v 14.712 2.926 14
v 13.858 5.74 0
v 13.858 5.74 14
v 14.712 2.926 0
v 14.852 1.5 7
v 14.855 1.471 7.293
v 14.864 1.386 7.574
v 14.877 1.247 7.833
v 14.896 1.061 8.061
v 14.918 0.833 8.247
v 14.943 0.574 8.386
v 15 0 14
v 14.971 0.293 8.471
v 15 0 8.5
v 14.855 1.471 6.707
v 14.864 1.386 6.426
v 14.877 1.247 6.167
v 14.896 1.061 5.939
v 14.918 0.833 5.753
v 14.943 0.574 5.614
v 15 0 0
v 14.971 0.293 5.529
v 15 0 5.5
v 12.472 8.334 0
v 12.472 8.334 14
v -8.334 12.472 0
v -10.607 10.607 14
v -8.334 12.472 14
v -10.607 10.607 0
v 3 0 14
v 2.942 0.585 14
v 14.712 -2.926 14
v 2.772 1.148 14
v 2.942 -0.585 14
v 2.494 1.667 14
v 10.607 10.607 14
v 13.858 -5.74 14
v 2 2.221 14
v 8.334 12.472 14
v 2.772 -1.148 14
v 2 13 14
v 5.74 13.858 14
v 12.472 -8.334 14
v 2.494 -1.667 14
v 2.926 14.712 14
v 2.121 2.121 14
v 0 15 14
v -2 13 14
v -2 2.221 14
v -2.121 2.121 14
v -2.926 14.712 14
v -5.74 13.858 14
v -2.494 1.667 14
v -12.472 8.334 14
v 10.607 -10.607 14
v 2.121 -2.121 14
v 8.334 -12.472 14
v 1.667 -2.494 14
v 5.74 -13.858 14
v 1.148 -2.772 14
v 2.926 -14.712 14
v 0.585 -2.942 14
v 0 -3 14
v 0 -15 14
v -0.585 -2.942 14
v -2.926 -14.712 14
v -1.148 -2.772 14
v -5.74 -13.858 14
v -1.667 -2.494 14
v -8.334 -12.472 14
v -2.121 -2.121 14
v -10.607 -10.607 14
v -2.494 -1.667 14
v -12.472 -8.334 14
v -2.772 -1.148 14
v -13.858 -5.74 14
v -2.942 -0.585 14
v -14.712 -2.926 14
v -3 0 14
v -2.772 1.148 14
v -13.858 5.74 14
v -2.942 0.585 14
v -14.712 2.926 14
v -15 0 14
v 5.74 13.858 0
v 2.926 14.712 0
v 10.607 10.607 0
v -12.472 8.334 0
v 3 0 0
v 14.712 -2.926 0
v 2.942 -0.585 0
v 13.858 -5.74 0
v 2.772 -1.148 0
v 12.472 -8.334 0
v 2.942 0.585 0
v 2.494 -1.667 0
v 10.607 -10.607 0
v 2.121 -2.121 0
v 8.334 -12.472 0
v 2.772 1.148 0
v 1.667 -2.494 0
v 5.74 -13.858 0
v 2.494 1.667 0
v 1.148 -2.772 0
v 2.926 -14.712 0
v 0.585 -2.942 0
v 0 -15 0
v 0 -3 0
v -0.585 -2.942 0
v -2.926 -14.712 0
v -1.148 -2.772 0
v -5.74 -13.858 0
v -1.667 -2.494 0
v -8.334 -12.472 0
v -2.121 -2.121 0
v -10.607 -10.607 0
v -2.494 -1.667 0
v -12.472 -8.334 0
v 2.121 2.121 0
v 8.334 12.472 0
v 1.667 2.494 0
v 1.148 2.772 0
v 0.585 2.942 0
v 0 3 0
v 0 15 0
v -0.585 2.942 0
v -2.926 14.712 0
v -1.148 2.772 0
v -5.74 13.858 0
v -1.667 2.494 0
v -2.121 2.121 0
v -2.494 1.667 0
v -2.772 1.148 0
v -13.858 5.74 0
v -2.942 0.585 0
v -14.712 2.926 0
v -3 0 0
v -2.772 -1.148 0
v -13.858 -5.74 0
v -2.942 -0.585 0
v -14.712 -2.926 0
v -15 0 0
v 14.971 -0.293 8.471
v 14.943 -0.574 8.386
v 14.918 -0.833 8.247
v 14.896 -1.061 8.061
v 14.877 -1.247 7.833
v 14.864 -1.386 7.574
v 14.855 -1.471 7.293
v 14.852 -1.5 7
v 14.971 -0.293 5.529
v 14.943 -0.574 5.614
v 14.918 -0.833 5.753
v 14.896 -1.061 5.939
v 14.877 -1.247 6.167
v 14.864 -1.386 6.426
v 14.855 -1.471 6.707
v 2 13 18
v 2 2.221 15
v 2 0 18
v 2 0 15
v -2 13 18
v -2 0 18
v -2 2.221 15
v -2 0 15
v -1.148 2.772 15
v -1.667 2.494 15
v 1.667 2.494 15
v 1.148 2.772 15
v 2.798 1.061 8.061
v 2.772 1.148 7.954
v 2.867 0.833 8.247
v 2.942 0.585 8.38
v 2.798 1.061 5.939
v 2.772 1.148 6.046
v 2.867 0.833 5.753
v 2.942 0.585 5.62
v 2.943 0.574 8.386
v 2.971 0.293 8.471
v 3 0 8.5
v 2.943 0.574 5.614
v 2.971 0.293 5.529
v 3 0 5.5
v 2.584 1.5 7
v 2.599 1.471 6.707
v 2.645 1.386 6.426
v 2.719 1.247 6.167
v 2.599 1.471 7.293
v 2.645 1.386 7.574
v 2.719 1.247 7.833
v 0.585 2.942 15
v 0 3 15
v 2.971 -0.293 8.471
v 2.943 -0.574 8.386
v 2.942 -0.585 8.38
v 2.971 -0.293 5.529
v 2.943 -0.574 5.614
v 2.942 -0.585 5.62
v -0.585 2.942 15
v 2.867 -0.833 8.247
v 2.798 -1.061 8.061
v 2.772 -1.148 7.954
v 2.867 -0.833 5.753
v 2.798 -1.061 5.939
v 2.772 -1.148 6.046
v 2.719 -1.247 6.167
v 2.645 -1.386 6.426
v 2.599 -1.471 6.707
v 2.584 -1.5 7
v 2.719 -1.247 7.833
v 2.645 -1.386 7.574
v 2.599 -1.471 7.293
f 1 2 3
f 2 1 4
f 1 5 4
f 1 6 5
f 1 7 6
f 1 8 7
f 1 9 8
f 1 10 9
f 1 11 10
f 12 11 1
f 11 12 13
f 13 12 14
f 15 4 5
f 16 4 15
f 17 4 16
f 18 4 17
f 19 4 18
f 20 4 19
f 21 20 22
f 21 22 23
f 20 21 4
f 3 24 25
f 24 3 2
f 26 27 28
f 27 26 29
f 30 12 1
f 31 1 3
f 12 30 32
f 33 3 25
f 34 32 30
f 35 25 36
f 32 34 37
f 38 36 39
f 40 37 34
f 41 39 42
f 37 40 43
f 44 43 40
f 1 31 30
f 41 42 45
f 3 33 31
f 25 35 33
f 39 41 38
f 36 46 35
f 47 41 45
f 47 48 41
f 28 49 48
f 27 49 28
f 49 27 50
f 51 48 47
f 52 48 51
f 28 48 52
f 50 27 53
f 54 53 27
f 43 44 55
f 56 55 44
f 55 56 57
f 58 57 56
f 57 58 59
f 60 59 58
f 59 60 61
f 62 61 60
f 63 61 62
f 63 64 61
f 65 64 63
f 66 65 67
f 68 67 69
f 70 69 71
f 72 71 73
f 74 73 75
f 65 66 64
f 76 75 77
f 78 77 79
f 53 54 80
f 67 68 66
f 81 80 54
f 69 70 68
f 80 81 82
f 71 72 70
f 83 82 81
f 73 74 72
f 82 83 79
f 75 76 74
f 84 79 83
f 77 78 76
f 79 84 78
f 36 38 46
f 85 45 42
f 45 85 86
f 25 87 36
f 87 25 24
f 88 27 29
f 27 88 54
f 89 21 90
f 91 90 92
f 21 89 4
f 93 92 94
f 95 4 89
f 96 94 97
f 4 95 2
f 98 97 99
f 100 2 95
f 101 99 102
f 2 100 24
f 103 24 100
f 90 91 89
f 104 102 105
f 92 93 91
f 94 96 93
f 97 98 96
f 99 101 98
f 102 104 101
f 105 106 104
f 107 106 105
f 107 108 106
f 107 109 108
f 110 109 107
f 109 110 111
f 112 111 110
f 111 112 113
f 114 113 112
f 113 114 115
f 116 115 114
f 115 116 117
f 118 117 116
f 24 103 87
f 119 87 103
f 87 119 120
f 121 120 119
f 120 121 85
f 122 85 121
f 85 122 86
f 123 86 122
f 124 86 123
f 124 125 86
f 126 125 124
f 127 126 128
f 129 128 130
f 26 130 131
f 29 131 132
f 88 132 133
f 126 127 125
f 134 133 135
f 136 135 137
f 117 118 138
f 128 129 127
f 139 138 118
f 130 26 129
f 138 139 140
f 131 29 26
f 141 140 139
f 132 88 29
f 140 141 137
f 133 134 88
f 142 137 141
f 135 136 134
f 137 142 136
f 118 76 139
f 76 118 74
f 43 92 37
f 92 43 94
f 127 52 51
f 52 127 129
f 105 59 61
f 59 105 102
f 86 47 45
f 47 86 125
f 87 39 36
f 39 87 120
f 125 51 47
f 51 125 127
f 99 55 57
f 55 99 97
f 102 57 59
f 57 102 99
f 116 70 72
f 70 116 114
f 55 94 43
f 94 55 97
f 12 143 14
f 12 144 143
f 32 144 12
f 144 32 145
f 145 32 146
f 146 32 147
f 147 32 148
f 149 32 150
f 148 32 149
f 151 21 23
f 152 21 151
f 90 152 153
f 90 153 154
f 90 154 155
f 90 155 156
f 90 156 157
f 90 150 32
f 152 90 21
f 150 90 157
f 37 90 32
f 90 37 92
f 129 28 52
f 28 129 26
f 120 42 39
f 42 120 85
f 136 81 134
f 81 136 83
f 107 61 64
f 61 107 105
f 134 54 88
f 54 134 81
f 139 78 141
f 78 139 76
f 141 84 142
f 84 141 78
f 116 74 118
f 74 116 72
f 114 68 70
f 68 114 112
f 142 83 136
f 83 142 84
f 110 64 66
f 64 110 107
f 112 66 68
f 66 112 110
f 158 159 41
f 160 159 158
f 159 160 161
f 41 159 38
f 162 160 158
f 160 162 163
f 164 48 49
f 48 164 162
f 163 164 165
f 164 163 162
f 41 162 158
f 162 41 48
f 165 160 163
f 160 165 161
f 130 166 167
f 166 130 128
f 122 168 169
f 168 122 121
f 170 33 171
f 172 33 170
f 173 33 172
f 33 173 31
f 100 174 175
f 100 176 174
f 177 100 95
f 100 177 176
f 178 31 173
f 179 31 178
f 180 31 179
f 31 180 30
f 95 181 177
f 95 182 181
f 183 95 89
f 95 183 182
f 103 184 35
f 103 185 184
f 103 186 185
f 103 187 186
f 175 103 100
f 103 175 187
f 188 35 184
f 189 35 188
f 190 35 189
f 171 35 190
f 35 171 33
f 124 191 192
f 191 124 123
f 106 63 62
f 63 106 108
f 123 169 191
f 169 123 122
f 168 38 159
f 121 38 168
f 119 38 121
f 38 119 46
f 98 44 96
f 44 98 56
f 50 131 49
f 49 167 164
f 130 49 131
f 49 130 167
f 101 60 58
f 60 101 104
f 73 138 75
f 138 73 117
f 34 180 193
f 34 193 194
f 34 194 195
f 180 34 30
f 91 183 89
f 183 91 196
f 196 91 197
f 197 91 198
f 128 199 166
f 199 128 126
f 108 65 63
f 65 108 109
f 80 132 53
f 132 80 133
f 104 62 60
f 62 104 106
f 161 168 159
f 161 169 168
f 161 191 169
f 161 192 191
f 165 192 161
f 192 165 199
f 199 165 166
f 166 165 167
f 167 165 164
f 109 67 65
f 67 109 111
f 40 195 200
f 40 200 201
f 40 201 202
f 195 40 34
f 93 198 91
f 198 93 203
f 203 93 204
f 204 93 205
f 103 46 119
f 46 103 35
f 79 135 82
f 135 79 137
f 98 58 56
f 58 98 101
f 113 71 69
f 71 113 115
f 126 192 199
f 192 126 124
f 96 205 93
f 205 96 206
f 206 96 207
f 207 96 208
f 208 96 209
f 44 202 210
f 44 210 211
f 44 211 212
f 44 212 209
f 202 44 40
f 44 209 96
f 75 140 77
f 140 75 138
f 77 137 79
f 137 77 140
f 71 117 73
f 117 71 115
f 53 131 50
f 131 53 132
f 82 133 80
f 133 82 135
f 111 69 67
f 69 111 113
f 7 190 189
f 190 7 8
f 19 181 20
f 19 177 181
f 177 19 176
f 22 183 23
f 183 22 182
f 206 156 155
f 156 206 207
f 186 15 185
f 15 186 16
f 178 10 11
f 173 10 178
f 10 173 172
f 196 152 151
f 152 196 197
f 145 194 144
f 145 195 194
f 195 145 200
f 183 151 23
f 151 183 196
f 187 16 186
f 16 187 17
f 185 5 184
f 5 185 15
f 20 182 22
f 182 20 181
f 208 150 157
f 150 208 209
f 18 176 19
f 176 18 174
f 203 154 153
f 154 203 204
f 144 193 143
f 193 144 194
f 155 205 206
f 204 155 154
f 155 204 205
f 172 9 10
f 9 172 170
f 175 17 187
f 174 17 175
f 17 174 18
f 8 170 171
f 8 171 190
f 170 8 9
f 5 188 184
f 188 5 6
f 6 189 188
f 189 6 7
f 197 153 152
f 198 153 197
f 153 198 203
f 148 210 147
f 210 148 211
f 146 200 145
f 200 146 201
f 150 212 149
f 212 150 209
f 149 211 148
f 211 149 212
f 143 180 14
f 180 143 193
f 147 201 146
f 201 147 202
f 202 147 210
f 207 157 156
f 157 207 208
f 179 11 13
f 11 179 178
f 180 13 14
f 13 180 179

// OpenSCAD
$fn = 32;

// ----------------------------------------------------------------------
// Control knob: pointer knob
// ----------------------------------------------------------------------

// --- parameters (mm) ---
rib_w = 4;                // pointer rib width
rib_h = 5;                // pointer rib height
knob_d = 30;              // knob body diameter
knob_h = 14;              // knob body height
bore_d = 6;               // shaft bore diameter
set_d = 3;                // set screw bore diameter

rib_poke = rib_h - 1;  // rib height above the top
total_h = knob_h + rib_h - 1;  // overall height

difference() {
  union() {
    cylinder(h = knob_h, d = knob_d);
    translate([-rib_w / 2, 0, knob_h - 1])
      cube([rib_w, knob_d / 2 - 2, rib_h]);
  }
  translate([0, 0, -1]) cylinder(h = knob_h + 2, d = bore_d);
  translate([-1, 0, knob_h / 2]) rotate([0, 90, 0])
    cylinder(h = knob_d / 2 + bore_d / 2 + 2, d = set_d);}
